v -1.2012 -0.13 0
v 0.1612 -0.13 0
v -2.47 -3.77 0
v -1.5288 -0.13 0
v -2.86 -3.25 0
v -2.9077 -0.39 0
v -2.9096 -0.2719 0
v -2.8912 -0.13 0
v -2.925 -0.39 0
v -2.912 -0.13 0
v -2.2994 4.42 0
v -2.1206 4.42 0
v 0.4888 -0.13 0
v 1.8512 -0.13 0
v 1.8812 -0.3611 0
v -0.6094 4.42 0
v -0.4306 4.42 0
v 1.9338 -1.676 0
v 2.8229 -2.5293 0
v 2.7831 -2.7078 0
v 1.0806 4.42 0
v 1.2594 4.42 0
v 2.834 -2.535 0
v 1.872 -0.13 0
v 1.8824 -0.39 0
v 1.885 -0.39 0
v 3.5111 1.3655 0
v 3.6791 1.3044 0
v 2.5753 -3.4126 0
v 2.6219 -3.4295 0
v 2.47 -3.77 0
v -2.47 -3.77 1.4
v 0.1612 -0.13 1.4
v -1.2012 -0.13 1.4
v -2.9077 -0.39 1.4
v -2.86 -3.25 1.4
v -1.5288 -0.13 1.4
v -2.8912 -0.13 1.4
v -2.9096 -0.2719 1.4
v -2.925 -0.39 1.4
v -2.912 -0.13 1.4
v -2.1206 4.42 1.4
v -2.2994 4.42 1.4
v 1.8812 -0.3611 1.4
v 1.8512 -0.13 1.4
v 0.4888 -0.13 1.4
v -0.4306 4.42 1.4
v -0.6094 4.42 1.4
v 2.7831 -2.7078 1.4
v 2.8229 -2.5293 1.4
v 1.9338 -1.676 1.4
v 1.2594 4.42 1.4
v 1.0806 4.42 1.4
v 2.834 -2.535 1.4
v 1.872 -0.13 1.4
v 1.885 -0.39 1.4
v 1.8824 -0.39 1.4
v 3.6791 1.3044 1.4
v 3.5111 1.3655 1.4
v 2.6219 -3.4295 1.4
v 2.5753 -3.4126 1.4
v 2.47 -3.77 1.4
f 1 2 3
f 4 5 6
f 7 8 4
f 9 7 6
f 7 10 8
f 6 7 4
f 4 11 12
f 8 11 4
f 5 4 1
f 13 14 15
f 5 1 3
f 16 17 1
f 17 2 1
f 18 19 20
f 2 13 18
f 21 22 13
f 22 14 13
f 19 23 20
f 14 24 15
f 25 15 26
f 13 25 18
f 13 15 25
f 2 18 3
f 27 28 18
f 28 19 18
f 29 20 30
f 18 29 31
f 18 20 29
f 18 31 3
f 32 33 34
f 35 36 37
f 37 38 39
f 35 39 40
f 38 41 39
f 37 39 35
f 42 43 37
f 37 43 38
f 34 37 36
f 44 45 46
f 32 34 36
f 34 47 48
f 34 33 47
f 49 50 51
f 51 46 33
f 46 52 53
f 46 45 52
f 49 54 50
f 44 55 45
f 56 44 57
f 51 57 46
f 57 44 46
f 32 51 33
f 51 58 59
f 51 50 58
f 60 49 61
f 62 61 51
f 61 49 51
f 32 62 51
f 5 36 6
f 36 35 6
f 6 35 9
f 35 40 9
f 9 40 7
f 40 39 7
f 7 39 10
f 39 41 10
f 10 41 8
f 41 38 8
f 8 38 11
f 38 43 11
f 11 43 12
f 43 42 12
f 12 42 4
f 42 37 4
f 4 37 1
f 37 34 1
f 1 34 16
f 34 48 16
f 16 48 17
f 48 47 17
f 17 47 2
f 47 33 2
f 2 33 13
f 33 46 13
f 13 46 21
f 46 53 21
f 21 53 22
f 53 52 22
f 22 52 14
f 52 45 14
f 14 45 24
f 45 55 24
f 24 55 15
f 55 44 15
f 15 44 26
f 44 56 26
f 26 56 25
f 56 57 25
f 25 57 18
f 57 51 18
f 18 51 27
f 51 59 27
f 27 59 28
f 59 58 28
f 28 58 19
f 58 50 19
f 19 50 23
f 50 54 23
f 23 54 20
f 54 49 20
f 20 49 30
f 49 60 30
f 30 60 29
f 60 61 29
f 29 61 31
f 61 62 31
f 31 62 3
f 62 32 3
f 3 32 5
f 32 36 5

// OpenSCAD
// Original dice are 14mm across and way 4g each.

eps = 0.001;

s = 13;
chamfer = 1;
engrave_depth = 1.8;
inlay_height = engrave_depth - 0.4;

module exterior() {
  hull() {
    for (a = [-1, 1], b = [-1, 1], c = [-1, 1]) {
      scale([a, b, c]) {
        translate((s/2 - chamfer) * [1, 1, 1]) {
          sphere(chamfer, $fn=32);
        }
      }
    }
  }
}

module claw_2d() {
  width = 11;
  height = 37;
  polygon([
    [-width/2, 0],
    [-width/16, height],
    [width/16, height],
    [width/2, 0]
  ]);
}

module hit_2d() {
  scale(s * 0.01 * [1, 1]) {
    translate([4, -1]) {
      for (a = 13 * [-1, 0, 1])
        translate([a, -2])
          claw_2d();
      translate([-19, -23.5])
        rotate([0, 0, 20])
          claw_2d();
      polygon([
        [-18.4, 0],
        [-19, -15],
        [-25.8, -18.5],
        [-23, -28],
        [15, -28],
        [18, -24],
        [18.4, 0],
      ]);
    }
  }
}

module hit() {
  linear_extrude(engrave_depth) {
    rotate([0, 0, 180]) {
      offset(0.3, $fn=12) {
        difference() {
          hit_2d();
          
        translate([-2, 4.2]) square([5, 1]);
        }
        
        // Cut off the very sharp peaks; they don't print well anyway.
        translate([-1, 0.8]) square([3, 2]);
      }
    }
  }
}

module miss_2d() {
  $fn = 70;
  
  scale(1.55 * [1, 1]) {
    translate([0, -0.4]) {
      intersection() {
        intersection_for(a = [-1, 1])
          scale([a, 1])
            translate([1, 0])
              circle(3.2);
        
        translate([0, 5])
          square([4, 10], center=true);
      }
      
      translate([-2, -1.7])
        square([4, 1.7]);
    }
  }
}

module miss() {
  linear_extrude(engrave_depth)
    rotate([0, 0, -90])
      offset(0.3, $fn=12)
        miss_2d();
}

module die() {
  difference() {
    exterior();
    
    for (a = [0, 90, 180])
      rotate([0, 0, a])
        rotate([90, 0, 0])
          translate([0, 0, s/2 - engrave_depth])
            hit();
    
    for (a = [0, -90])
      rotate([0, a, 0])
        translate([0, 0, s/2 - engrave_depth])
          miss();
  }
}

scale([-1, 1])
linear_extrude(inlay_height)
  hit_2d();
